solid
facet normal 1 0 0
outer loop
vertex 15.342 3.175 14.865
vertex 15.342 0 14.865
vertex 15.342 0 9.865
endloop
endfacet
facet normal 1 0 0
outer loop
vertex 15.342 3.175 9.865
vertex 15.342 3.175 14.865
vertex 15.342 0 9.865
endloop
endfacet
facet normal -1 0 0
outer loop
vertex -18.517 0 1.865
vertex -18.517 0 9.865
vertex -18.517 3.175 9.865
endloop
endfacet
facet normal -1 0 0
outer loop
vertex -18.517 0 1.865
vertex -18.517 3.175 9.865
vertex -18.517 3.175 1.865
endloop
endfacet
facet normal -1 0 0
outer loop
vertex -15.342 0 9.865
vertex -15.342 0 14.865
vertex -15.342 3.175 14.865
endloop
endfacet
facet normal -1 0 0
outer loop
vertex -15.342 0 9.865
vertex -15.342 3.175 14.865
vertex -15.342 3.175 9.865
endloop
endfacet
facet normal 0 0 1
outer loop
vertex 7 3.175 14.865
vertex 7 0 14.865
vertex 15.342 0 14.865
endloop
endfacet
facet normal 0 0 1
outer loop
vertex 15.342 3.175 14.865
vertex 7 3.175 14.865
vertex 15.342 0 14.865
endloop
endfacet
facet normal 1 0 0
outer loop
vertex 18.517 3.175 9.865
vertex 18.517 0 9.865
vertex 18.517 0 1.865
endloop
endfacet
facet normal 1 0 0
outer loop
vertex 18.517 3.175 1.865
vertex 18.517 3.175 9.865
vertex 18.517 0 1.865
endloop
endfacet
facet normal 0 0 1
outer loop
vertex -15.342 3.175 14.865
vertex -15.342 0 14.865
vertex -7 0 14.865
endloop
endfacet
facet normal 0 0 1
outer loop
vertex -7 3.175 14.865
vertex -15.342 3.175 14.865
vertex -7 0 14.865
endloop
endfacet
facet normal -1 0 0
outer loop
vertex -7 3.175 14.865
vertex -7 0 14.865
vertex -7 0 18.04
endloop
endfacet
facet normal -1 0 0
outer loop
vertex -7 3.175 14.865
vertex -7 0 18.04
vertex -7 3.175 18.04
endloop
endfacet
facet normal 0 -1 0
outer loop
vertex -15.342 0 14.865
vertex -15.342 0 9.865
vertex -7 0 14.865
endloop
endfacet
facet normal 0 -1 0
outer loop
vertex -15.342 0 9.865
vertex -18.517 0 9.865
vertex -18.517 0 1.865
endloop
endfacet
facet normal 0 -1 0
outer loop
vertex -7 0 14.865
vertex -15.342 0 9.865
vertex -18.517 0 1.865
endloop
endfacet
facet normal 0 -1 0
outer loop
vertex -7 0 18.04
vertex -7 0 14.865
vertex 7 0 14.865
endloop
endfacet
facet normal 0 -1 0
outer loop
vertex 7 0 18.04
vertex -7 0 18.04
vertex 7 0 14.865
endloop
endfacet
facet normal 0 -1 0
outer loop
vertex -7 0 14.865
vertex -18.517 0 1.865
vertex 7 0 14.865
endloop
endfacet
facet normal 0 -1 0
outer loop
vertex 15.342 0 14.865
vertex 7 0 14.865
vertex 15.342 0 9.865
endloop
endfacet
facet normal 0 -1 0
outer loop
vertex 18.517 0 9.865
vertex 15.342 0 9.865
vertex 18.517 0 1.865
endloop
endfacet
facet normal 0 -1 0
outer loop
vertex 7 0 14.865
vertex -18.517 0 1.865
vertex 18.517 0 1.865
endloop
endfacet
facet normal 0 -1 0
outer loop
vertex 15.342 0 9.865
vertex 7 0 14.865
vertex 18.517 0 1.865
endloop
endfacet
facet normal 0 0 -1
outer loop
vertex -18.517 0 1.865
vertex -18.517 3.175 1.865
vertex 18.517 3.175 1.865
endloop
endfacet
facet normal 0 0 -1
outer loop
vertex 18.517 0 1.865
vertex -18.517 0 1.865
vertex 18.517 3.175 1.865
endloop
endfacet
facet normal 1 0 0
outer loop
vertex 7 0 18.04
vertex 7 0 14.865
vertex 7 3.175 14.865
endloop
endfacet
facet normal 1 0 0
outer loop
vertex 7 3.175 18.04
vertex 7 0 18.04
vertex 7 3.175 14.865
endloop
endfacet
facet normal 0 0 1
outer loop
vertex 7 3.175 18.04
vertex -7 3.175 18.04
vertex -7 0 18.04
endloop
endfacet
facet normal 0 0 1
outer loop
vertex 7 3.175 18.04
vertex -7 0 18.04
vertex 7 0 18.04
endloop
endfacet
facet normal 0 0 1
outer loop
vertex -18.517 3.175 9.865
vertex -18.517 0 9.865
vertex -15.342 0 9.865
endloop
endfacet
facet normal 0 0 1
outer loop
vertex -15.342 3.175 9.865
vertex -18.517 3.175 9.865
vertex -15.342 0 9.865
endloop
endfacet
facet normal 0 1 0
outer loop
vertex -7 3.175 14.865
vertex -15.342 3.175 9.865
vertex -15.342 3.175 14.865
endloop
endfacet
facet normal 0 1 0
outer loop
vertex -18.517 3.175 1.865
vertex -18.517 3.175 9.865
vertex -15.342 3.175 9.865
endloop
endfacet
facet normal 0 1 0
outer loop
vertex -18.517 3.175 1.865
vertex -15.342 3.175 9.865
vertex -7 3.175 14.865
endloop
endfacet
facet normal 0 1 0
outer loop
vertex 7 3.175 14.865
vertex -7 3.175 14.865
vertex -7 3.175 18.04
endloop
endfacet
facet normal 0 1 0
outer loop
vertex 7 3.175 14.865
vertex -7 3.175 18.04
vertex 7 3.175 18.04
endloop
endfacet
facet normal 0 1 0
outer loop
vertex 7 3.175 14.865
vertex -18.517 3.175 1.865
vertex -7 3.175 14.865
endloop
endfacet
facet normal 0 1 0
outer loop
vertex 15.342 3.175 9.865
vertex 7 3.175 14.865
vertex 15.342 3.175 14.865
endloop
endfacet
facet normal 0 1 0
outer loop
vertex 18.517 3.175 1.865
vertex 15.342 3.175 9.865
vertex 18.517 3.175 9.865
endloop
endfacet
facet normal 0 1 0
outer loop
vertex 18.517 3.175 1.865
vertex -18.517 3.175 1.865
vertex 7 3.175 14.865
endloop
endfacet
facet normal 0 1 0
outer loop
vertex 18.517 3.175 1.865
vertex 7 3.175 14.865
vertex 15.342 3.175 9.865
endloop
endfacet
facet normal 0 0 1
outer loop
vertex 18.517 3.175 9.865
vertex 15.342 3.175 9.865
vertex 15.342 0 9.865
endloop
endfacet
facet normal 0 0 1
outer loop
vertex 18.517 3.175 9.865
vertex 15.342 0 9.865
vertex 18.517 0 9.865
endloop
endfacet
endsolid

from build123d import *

# Parameters (mm, degrees)
SKETCH1_W           = 3.175
SKETCH1_H           = 8
SKETCH1_W_2         = 30.6846
SKETCH1_H_2         = 29.73
BOSS_EXTRUDE1_DEPTH = 3.175
SKETCH2_W           = 14
SKETCH2_H           = 3.175
BOSS_EXTRUDE5_DEPTH = 3.175
SKETCH3_W           = 3.175
SKETCH3_H           = 8
SKETCH3_W_2         = 5.123924413
SKETCH3_H_2         = 0.857075887
CUT_EXTRUDE1_DEPTH  = 3.175


with BuildPart() as part:
    # Sketch1 → Boss-Extrude1 (new body)
    with BuildSketch(Plane(origin=(0, 0, 0), x_dir=(1, 0, 0), z_dir=(0, 1, 0))):
        with Locations((-16.9298, 5.865)):
            Rectangle(SKETCH1_W, SKETCH1_H)
        Rectangle(SKETCH1_W_2, SKETCH1_H_2)
        with Locations((16.9298, -5.865)):
            Rectangle(SKETCH1_W, SKETCH1_H)
        with Locations((16.9298, 5.865)):
            Rectangle(SKETCH1_W, SKETCH1_H)
        with Locations((-16.9298, -5.865)):
            Rectangle(SKETCH1_W, SKETCH1_H)
    extrude(amount=BOSS_EXTRUDE1_DEPTH)

    # Sketch2 → Boss-Extrude5 (add)
    with BuildSketch(Plane.XY.offset(14.865)):
        with Locations((0, 1.5875)):
            Rectangle(SKETCH2_W, SKETCH2_H)
    extrude(amount=BOSS_EXTRUDE5_DEPTH)

    # Sketch3 → Cut-Extrude1 (cut)
    with BuildSketch(Plane(origin=(0, 3.175, 0), x_dir=(1, 0, 0), z_dir=(0, 1, 0))):
        Polygon((-18.5173, -1.865), (-15.3423, -1.865), (-15.3423, 1.865), (-18.5173, 1.865), (-18.5173, 9.865), (-15.3423, 9.865), (-15.3423, 14.865), (-15.3423, 15.722075887), (-23.299658128, 15.722075887), (-23.299658128, -1.865), align=None)
        Polygon((-15.3423, 1.865), (-15.3423, -1.865), (-10.218375587, -1.865), (-10.218375587, 14.865), (-15.3423, 14.865), (-15.3423, 9.865), align=None)
        Polygon((-10.218375587, 14.865), (-10.218375587, -1.865), (15.3423, -1.865), (15.3423, 1.865), (18.5173, 1.865), (18.5173, 9.865), (15.3423, 9.865), (15.3423, 14.865), align=None)
        Polygon((15.3423, 1.865), (15.3423, -1.865), (18.5173, -1.865), (22.154495347, -1.865), (22.154495347, 15.722075887), (-10.218375587, 15.722075887), (-10.218375587, 14.865), (15.3423, 14.865), (15.3423, 9.865), (18.5173, 9.865), (18.5173, 1.865), align=None)
        with Locations((-16.9298, 5.865)):
            Rectangle(SKETCH3_W, SKETCH3_H)
        with Locations((-12.780337794, 15.293537944)):
            Rectangle(SKETCH3_W_2, SKETCH3_H_2)
    extrude(amount=-CUT_EXTRUDE1_DEPTH, mode=Mode.SUBTRACT)


solid = part.part
